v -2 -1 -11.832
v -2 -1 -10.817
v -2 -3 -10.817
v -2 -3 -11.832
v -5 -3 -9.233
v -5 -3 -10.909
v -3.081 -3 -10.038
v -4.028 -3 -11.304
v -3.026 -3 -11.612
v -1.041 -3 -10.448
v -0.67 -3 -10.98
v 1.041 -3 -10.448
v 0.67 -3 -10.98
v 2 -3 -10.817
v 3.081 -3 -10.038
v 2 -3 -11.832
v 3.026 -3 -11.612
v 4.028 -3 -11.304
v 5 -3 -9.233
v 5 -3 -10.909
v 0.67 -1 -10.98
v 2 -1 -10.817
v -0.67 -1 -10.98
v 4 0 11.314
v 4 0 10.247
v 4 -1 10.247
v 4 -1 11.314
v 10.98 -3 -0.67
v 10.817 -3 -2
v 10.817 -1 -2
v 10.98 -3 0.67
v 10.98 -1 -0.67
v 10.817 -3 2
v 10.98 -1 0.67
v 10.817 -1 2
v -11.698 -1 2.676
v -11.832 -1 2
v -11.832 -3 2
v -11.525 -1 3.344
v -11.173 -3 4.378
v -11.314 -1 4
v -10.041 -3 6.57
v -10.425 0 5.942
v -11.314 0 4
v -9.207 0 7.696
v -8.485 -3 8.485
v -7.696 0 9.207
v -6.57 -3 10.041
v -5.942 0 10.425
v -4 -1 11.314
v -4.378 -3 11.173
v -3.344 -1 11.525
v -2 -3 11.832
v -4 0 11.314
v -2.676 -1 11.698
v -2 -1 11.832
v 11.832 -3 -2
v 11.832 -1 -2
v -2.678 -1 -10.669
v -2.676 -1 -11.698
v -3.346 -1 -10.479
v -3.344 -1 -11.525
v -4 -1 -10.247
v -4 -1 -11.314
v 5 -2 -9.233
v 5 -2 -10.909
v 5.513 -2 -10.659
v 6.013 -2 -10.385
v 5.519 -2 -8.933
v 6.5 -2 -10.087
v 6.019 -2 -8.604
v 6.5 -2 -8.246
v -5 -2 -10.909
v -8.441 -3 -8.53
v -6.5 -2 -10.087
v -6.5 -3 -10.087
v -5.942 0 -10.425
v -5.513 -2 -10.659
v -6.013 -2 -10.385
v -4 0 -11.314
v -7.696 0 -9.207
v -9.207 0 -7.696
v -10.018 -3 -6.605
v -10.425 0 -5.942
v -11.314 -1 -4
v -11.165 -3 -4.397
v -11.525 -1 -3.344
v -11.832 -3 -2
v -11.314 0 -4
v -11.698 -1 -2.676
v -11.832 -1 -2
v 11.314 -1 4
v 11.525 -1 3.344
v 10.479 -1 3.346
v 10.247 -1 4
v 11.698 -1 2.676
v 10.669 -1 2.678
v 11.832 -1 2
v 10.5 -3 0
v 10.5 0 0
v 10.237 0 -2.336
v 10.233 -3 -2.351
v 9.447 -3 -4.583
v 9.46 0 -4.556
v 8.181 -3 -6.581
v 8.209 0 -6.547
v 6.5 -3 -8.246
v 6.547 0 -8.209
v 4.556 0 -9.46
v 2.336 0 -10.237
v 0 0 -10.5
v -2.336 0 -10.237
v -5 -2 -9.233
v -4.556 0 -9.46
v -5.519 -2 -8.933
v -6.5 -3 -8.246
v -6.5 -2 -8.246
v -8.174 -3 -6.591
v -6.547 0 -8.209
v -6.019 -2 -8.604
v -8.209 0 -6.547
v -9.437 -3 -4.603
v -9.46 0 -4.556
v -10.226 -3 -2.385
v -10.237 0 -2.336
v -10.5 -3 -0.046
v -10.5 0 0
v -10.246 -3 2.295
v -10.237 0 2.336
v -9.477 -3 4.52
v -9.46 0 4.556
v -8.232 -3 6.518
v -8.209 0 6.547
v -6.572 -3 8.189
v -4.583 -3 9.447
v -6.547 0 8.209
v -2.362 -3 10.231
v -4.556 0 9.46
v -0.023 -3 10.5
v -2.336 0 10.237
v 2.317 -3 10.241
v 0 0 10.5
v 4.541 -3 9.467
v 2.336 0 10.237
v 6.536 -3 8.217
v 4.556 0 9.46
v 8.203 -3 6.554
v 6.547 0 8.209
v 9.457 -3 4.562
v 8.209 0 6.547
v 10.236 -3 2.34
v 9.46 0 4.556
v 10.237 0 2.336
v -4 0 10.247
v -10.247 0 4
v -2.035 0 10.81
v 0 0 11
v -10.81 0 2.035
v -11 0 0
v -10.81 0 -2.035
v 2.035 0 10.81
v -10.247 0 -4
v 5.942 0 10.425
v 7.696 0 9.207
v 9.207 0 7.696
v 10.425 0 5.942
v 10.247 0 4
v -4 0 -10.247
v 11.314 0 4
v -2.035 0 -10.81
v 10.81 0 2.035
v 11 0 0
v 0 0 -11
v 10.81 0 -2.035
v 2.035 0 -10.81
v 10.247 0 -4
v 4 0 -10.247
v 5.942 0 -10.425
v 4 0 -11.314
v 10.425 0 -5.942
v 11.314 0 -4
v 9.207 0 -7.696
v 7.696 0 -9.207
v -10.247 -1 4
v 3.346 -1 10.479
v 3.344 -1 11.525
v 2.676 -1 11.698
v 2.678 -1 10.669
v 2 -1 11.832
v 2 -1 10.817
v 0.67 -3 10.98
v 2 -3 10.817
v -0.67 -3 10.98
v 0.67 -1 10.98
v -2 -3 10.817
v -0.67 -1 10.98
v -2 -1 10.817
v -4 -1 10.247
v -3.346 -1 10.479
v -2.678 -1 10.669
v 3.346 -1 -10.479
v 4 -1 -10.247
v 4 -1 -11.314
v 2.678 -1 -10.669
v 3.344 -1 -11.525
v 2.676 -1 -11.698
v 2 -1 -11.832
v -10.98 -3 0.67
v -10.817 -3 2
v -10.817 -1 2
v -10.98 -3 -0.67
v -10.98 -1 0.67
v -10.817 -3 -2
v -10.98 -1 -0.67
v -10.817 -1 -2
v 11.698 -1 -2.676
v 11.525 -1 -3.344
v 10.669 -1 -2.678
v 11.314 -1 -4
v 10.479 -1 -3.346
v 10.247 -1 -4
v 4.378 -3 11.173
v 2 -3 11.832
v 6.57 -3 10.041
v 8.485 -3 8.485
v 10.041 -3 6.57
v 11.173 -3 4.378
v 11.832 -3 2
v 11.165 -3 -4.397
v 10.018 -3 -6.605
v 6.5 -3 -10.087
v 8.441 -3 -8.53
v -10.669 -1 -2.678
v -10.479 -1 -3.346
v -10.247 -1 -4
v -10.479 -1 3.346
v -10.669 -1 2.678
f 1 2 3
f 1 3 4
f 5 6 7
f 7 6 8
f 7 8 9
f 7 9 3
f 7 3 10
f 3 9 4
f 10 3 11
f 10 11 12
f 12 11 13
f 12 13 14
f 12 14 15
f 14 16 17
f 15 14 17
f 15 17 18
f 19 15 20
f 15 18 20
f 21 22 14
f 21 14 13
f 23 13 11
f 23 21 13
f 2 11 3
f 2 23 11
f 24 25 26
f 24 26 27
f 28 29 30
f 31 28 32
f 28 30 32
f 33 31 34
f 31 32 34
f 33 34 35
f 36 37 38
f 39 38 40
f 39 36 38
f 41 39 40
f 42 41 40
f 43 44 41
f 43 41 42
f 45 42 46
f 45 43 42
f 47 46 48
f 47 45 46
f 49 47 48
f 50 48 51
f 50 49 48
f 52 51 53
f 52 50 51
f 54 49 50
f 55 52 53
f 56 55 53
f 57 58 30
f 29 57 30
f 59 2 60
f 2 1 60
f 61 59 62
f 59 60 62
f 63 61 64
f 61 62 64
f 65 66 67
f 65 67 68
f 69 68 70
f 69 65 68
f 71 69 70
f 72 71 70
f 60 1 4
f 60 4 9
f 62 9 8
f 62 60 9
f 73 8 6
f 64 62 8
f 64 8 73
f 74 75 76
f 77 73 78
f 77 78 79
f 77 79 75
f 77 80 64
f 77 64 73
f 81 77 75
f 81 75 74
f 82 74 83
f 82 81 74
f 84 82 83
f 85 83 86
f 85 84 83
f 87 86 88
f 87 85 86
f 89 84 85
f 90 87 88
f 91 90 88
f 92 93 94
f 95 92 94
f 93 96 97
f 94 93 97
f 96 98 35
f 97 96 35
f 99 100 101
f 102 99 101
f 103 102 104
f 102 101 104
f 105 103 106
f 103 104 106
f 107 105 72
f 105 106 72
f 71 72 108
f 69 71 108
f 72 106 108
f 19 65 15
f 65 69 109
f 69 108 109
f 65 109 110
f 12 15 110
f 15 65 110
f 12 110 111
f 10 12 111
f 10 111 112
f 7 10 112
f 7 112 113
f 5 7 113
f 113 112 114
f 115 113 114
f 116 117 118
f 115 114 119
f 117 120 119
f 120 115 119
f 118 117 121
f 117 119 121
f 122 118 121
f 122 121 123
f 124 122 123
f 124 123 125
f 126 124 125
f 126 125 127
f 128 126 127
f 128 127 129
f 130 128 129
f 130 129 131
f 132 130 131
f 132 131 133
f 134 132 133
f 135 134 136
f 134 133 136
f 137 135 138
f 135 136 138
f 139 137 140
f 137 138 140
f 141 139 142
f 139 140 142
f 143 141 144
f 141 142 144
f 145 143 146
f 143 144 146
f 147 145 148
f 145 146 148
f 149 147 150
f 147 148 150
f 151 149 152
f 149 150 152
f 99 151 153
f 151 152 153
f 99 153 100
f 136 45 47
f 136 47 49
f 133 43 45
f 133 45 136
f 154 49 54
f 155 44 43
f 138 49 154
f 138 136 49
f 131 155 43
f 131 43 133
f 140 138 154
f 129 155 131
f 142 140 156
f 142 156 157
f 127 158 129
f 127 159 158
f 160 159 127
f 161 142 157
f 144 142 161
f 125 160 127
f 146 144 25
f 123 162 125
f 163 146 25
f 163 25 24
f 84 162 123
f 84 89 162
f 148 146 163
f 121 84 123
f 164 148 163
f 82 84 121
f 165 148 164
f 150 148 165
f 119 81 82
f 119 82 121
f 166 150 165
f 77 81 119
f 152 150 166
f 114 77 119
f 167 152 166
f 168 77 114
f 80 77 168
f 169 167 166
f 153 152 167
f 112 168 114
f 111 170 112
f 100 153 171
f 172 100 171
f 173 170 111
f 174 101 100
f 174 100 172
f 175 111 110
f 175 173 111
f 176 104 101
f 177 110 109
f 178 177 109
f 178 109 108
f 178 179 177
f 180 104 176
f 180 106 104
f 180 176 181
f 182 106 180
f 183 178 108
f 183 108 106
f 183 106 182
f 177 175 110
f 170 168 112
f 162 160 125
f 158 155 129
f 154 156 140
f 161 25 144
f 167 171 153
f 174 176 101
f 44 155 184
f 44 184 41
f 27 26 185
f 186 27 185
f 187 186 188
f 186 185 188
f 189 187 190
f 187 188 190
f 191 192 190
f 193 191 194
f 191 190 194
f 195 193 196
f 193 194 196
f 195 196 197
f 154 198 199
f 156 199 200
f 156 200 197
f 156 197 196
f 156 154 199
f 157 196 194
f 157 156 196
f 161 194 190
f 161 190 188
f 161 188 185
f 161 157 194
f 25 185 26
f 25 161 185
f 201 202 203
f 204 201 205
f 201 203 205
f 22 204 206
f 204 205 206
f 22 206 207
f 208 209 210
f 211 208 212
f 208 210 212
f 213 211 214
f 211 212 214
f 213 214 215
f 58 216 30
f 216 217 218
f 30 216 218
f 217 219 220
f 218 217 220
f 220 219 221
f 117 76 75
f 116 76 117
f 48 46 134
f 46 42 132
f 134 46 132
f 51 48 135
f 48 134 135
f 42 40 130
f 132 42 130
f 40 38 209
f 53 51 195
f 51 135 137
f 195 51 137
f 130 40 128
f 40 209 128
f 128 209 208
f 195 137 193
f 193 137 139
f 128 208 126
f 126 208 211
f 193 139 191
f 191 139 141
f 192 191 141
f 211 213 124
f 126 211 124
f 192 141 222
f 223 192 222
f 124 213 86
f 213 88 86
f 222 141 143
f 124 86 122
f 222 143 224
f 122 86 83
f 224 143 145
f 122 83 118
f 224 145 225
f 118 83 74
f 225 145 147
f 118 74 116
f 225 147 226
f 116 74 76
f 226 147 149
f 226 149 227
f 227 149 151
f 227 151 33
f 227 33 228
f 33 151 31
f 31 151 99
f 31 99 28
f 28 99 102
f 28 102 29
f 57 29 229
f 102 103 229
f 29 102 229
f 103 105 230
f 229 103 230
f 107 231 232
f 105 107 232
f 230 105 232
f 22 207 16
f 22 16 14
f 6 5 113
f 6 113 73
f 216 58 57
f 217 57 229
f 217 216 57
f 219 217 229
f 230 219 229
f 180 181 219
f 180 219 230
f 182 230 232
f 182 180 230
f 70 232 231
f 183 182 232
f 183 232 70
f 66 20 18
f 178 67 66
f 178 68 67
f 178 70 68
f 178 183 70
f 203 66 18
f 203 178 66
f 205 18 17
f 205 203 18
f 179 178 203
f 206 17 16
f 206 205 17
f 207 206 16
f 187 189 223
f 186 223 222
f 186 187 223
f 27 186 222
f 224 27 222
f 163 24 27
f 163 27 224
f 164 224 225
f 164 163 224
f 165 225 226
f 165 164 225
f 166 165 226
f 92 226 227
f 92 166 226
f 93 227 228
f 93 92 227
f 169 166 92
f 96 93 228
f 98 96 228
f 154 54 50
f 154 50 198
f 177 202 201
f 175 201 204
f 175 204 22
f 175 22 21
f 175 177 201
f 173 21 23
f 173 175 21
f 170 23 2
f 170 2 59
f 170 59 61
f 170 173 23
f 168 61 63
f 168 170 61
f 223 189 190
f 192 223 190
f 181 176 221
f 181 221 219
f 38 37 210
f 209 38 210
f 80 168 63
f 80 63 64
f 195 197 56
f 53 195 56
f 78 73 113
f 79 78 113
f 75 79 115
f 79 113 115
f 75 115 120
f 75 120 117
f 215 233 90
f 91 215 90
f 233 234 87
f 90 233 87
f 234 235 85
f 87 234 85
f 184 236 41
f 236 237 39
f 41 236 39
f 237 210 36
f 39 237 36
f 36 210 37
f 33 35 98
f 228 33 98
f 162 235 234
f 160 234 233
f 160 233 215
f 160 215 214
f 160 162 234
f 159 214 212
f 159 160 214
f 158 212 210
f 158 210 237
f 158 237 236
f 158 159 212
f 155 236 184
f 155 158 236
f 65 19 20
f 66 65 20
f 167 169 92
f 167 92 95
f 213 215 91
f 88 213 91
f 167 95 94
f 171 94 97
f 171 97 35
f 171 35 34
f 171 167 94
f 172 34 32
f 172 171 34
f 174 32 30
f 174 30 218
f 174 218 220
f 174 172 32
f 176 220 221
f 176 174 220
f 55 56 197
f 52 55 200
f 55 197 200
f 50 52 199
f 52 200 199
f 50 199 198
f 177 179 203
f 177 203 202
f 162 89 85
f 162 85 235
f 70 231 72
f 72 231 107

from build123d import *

# Parameters (mm, degrees)
SKETCH1_R           = 12
SKETCH1_R_2         = 10.5
BOSS_EXTRUDE1_DEPTH = 3
CUT_EXTRUDE1_DEPTH  = 1
CUT_EXTRUDE2_DEPTH  = 3
CUT_EXTRUDE3_DEPTH  = 1


with BuildPart() as part:
    # Sketch1 → Boss-Extrude1 (new body)
    with BuildSketch(Plane(origin=(0, 0, 0), x_dir=(1, 0, 0), z_dir=(0, 1, 0))):
        Circle(SKETCH1_R)
        Circle(SKETCH1_R_2, mode=Mode.SUBTRACT)
    extrude(amount=-BOSS_EXTRUDE1_DEPTH)

    # Sketch6 → Cut-Extrude1 (cut)
    with BuildSketch(Plane(origin=(0, 0, 0), x_dir=(1, 0, 0), z_dir=(0, 1, 0))):
        with BuildLine():
            Line((10.246950766, 4), (11.313708499, 4))
            ThreePointArc((11.313708499, 4), (12, 0), (11.313708499, -4))
            Line((11.313708499, -4), (10.246950766, -4))
            ThreePointArc((10.246950766, -4), (11, 0), (10.246950766, 4))
        make_face()
        with BuildLine():
            Line((-4, 10.246950766), (-4, 11.313708499))
            ThreePointArc((-4, 11.313708499), (0, 12), (4, 11.313708499))
            Line((4, 11.313708499), (4, 10.246950766))
            ThreePointArc((4, 10.246950766), (0, 11), (-4, 10.246950766))
        make_face()
        with BuildLine():
            Line((4, -10.246950766), (4, -11.313708499))
            ThreePointArc((4, -11.313708499), (0, -12), (-4, -11.313708499))
            Line((-4, -11.313708499), (-4, -10.246950766))
            ThreePointArc((-4, -10.246950766), (0, -11), (4, -10.246950766))
        make_face()
        with BuildLine():
            Line((-10.246950766, -4), (-11.313708499, -4))
            ThreePointArc((-11.313708499, -4), (-12, 0), (-11.313708499, 4))
            Line((-11.313708499, 4), (-10.246950766, 4))
            ThreePointArc((-10.246950766, 4), (-11, 0), (-10.246950766, -4))
        make_face()
    extrude(amount=-CUT_EXTRUDE1_DEPTH, mode=Mode.SUBTRACT)

    # Sketch7 → Cut-Extrude2 (cut, through all)
    with BuildSketch(Plane(origin=(0, -1, 0), x_dir=(1, 0, 0), z_dir=(0, 1, 0))):
        with BuildLine():
            Line((-2, 10.816653826), (-2, 11.832159566))
            ThreePointArc((-2, 11.832159566), (0, 12), (2, 11.832159566))
            Line((2, 11.832159566), (2, 10.816653826))
            ThreePointArc((2, 10.816653826), (0, 11), (-2, 10.816653826))
        make_face()
        with BuildLine():
            Line((10.816653826, -2), (11.832159566, -2))
            ThreePointArc((11.832159566, -2), (12, 0), (11.832159566, 2))
            Line((11.832159566, 2), (10.816653826, 2))
            ThreePointArc((10.816653826, 2), (11, 0), (10.816653826, -2))
        make_face()
        with BuildLine():
            Line((-2, -10.816653826), (-2, -11.832159566))
            ThreePointArc((-2, -11.832159566), (0, -12), (2, -11.832159566))
            Line((2, -11.832159566), (2, -10.816653826))
            ThreePointArc((2, -10.816653826), (0, -11), (-2, -10.816653826))
        make_face()
        with BuildLine():
            Line((-10.816653826, 2), (-11.832159566, 2))
            ThreePointArc((-11.832159566, 2), (-12, 0), (-11.832159566, -2))
            Line((-11.832159566, -2), (-10.816653826, -2))
            ThreePointArc((-10.816653826, -2), (-11, 0), (-10.816653826, 2))
        make_face()
    extrude(amount=-CUT_EXTRUDE2_DEPTH, mode=Mode.SUBTRACT)

    # Sketch8 → Cut-Extrude3 (cut)
    with BuildSketch(Plane.XZ.offset(3)):
        with BuildLine():
            Line((-5, -9.233092656), (-5, -10.908712115))
            ThreePointArc((-5, -10.908712115), (-5.764655514, -10.52467324), (-6.5, -10.087120501))
            Line((-6.5, -10.087120501), (-6.5, -8.246211251))
            ThreePointArc((-6.5, -8.246211251), (-5.77113366, -8.771773838), (-5, -9.233092656))
        make_face()
        with BuildLine():
            Line((5, -9.233092656), (5, -10.908712115))
            ThreePointArc((5, -10.908712115), (5.764655514, -10.52467324), (6.5, -10.087120501))
            Line((6.5, -10.087120501), (6.5, -8.246211251))
            ThreePointArc((6.5, -8.246211251), (5.77113366, -8.771773838), (5, -9.233092656))
        make_face()
    extrude(amount=-CUT_EXTRUDE3_DEPTH, mode=Mode.SUBTRACT)


solid = part.part
